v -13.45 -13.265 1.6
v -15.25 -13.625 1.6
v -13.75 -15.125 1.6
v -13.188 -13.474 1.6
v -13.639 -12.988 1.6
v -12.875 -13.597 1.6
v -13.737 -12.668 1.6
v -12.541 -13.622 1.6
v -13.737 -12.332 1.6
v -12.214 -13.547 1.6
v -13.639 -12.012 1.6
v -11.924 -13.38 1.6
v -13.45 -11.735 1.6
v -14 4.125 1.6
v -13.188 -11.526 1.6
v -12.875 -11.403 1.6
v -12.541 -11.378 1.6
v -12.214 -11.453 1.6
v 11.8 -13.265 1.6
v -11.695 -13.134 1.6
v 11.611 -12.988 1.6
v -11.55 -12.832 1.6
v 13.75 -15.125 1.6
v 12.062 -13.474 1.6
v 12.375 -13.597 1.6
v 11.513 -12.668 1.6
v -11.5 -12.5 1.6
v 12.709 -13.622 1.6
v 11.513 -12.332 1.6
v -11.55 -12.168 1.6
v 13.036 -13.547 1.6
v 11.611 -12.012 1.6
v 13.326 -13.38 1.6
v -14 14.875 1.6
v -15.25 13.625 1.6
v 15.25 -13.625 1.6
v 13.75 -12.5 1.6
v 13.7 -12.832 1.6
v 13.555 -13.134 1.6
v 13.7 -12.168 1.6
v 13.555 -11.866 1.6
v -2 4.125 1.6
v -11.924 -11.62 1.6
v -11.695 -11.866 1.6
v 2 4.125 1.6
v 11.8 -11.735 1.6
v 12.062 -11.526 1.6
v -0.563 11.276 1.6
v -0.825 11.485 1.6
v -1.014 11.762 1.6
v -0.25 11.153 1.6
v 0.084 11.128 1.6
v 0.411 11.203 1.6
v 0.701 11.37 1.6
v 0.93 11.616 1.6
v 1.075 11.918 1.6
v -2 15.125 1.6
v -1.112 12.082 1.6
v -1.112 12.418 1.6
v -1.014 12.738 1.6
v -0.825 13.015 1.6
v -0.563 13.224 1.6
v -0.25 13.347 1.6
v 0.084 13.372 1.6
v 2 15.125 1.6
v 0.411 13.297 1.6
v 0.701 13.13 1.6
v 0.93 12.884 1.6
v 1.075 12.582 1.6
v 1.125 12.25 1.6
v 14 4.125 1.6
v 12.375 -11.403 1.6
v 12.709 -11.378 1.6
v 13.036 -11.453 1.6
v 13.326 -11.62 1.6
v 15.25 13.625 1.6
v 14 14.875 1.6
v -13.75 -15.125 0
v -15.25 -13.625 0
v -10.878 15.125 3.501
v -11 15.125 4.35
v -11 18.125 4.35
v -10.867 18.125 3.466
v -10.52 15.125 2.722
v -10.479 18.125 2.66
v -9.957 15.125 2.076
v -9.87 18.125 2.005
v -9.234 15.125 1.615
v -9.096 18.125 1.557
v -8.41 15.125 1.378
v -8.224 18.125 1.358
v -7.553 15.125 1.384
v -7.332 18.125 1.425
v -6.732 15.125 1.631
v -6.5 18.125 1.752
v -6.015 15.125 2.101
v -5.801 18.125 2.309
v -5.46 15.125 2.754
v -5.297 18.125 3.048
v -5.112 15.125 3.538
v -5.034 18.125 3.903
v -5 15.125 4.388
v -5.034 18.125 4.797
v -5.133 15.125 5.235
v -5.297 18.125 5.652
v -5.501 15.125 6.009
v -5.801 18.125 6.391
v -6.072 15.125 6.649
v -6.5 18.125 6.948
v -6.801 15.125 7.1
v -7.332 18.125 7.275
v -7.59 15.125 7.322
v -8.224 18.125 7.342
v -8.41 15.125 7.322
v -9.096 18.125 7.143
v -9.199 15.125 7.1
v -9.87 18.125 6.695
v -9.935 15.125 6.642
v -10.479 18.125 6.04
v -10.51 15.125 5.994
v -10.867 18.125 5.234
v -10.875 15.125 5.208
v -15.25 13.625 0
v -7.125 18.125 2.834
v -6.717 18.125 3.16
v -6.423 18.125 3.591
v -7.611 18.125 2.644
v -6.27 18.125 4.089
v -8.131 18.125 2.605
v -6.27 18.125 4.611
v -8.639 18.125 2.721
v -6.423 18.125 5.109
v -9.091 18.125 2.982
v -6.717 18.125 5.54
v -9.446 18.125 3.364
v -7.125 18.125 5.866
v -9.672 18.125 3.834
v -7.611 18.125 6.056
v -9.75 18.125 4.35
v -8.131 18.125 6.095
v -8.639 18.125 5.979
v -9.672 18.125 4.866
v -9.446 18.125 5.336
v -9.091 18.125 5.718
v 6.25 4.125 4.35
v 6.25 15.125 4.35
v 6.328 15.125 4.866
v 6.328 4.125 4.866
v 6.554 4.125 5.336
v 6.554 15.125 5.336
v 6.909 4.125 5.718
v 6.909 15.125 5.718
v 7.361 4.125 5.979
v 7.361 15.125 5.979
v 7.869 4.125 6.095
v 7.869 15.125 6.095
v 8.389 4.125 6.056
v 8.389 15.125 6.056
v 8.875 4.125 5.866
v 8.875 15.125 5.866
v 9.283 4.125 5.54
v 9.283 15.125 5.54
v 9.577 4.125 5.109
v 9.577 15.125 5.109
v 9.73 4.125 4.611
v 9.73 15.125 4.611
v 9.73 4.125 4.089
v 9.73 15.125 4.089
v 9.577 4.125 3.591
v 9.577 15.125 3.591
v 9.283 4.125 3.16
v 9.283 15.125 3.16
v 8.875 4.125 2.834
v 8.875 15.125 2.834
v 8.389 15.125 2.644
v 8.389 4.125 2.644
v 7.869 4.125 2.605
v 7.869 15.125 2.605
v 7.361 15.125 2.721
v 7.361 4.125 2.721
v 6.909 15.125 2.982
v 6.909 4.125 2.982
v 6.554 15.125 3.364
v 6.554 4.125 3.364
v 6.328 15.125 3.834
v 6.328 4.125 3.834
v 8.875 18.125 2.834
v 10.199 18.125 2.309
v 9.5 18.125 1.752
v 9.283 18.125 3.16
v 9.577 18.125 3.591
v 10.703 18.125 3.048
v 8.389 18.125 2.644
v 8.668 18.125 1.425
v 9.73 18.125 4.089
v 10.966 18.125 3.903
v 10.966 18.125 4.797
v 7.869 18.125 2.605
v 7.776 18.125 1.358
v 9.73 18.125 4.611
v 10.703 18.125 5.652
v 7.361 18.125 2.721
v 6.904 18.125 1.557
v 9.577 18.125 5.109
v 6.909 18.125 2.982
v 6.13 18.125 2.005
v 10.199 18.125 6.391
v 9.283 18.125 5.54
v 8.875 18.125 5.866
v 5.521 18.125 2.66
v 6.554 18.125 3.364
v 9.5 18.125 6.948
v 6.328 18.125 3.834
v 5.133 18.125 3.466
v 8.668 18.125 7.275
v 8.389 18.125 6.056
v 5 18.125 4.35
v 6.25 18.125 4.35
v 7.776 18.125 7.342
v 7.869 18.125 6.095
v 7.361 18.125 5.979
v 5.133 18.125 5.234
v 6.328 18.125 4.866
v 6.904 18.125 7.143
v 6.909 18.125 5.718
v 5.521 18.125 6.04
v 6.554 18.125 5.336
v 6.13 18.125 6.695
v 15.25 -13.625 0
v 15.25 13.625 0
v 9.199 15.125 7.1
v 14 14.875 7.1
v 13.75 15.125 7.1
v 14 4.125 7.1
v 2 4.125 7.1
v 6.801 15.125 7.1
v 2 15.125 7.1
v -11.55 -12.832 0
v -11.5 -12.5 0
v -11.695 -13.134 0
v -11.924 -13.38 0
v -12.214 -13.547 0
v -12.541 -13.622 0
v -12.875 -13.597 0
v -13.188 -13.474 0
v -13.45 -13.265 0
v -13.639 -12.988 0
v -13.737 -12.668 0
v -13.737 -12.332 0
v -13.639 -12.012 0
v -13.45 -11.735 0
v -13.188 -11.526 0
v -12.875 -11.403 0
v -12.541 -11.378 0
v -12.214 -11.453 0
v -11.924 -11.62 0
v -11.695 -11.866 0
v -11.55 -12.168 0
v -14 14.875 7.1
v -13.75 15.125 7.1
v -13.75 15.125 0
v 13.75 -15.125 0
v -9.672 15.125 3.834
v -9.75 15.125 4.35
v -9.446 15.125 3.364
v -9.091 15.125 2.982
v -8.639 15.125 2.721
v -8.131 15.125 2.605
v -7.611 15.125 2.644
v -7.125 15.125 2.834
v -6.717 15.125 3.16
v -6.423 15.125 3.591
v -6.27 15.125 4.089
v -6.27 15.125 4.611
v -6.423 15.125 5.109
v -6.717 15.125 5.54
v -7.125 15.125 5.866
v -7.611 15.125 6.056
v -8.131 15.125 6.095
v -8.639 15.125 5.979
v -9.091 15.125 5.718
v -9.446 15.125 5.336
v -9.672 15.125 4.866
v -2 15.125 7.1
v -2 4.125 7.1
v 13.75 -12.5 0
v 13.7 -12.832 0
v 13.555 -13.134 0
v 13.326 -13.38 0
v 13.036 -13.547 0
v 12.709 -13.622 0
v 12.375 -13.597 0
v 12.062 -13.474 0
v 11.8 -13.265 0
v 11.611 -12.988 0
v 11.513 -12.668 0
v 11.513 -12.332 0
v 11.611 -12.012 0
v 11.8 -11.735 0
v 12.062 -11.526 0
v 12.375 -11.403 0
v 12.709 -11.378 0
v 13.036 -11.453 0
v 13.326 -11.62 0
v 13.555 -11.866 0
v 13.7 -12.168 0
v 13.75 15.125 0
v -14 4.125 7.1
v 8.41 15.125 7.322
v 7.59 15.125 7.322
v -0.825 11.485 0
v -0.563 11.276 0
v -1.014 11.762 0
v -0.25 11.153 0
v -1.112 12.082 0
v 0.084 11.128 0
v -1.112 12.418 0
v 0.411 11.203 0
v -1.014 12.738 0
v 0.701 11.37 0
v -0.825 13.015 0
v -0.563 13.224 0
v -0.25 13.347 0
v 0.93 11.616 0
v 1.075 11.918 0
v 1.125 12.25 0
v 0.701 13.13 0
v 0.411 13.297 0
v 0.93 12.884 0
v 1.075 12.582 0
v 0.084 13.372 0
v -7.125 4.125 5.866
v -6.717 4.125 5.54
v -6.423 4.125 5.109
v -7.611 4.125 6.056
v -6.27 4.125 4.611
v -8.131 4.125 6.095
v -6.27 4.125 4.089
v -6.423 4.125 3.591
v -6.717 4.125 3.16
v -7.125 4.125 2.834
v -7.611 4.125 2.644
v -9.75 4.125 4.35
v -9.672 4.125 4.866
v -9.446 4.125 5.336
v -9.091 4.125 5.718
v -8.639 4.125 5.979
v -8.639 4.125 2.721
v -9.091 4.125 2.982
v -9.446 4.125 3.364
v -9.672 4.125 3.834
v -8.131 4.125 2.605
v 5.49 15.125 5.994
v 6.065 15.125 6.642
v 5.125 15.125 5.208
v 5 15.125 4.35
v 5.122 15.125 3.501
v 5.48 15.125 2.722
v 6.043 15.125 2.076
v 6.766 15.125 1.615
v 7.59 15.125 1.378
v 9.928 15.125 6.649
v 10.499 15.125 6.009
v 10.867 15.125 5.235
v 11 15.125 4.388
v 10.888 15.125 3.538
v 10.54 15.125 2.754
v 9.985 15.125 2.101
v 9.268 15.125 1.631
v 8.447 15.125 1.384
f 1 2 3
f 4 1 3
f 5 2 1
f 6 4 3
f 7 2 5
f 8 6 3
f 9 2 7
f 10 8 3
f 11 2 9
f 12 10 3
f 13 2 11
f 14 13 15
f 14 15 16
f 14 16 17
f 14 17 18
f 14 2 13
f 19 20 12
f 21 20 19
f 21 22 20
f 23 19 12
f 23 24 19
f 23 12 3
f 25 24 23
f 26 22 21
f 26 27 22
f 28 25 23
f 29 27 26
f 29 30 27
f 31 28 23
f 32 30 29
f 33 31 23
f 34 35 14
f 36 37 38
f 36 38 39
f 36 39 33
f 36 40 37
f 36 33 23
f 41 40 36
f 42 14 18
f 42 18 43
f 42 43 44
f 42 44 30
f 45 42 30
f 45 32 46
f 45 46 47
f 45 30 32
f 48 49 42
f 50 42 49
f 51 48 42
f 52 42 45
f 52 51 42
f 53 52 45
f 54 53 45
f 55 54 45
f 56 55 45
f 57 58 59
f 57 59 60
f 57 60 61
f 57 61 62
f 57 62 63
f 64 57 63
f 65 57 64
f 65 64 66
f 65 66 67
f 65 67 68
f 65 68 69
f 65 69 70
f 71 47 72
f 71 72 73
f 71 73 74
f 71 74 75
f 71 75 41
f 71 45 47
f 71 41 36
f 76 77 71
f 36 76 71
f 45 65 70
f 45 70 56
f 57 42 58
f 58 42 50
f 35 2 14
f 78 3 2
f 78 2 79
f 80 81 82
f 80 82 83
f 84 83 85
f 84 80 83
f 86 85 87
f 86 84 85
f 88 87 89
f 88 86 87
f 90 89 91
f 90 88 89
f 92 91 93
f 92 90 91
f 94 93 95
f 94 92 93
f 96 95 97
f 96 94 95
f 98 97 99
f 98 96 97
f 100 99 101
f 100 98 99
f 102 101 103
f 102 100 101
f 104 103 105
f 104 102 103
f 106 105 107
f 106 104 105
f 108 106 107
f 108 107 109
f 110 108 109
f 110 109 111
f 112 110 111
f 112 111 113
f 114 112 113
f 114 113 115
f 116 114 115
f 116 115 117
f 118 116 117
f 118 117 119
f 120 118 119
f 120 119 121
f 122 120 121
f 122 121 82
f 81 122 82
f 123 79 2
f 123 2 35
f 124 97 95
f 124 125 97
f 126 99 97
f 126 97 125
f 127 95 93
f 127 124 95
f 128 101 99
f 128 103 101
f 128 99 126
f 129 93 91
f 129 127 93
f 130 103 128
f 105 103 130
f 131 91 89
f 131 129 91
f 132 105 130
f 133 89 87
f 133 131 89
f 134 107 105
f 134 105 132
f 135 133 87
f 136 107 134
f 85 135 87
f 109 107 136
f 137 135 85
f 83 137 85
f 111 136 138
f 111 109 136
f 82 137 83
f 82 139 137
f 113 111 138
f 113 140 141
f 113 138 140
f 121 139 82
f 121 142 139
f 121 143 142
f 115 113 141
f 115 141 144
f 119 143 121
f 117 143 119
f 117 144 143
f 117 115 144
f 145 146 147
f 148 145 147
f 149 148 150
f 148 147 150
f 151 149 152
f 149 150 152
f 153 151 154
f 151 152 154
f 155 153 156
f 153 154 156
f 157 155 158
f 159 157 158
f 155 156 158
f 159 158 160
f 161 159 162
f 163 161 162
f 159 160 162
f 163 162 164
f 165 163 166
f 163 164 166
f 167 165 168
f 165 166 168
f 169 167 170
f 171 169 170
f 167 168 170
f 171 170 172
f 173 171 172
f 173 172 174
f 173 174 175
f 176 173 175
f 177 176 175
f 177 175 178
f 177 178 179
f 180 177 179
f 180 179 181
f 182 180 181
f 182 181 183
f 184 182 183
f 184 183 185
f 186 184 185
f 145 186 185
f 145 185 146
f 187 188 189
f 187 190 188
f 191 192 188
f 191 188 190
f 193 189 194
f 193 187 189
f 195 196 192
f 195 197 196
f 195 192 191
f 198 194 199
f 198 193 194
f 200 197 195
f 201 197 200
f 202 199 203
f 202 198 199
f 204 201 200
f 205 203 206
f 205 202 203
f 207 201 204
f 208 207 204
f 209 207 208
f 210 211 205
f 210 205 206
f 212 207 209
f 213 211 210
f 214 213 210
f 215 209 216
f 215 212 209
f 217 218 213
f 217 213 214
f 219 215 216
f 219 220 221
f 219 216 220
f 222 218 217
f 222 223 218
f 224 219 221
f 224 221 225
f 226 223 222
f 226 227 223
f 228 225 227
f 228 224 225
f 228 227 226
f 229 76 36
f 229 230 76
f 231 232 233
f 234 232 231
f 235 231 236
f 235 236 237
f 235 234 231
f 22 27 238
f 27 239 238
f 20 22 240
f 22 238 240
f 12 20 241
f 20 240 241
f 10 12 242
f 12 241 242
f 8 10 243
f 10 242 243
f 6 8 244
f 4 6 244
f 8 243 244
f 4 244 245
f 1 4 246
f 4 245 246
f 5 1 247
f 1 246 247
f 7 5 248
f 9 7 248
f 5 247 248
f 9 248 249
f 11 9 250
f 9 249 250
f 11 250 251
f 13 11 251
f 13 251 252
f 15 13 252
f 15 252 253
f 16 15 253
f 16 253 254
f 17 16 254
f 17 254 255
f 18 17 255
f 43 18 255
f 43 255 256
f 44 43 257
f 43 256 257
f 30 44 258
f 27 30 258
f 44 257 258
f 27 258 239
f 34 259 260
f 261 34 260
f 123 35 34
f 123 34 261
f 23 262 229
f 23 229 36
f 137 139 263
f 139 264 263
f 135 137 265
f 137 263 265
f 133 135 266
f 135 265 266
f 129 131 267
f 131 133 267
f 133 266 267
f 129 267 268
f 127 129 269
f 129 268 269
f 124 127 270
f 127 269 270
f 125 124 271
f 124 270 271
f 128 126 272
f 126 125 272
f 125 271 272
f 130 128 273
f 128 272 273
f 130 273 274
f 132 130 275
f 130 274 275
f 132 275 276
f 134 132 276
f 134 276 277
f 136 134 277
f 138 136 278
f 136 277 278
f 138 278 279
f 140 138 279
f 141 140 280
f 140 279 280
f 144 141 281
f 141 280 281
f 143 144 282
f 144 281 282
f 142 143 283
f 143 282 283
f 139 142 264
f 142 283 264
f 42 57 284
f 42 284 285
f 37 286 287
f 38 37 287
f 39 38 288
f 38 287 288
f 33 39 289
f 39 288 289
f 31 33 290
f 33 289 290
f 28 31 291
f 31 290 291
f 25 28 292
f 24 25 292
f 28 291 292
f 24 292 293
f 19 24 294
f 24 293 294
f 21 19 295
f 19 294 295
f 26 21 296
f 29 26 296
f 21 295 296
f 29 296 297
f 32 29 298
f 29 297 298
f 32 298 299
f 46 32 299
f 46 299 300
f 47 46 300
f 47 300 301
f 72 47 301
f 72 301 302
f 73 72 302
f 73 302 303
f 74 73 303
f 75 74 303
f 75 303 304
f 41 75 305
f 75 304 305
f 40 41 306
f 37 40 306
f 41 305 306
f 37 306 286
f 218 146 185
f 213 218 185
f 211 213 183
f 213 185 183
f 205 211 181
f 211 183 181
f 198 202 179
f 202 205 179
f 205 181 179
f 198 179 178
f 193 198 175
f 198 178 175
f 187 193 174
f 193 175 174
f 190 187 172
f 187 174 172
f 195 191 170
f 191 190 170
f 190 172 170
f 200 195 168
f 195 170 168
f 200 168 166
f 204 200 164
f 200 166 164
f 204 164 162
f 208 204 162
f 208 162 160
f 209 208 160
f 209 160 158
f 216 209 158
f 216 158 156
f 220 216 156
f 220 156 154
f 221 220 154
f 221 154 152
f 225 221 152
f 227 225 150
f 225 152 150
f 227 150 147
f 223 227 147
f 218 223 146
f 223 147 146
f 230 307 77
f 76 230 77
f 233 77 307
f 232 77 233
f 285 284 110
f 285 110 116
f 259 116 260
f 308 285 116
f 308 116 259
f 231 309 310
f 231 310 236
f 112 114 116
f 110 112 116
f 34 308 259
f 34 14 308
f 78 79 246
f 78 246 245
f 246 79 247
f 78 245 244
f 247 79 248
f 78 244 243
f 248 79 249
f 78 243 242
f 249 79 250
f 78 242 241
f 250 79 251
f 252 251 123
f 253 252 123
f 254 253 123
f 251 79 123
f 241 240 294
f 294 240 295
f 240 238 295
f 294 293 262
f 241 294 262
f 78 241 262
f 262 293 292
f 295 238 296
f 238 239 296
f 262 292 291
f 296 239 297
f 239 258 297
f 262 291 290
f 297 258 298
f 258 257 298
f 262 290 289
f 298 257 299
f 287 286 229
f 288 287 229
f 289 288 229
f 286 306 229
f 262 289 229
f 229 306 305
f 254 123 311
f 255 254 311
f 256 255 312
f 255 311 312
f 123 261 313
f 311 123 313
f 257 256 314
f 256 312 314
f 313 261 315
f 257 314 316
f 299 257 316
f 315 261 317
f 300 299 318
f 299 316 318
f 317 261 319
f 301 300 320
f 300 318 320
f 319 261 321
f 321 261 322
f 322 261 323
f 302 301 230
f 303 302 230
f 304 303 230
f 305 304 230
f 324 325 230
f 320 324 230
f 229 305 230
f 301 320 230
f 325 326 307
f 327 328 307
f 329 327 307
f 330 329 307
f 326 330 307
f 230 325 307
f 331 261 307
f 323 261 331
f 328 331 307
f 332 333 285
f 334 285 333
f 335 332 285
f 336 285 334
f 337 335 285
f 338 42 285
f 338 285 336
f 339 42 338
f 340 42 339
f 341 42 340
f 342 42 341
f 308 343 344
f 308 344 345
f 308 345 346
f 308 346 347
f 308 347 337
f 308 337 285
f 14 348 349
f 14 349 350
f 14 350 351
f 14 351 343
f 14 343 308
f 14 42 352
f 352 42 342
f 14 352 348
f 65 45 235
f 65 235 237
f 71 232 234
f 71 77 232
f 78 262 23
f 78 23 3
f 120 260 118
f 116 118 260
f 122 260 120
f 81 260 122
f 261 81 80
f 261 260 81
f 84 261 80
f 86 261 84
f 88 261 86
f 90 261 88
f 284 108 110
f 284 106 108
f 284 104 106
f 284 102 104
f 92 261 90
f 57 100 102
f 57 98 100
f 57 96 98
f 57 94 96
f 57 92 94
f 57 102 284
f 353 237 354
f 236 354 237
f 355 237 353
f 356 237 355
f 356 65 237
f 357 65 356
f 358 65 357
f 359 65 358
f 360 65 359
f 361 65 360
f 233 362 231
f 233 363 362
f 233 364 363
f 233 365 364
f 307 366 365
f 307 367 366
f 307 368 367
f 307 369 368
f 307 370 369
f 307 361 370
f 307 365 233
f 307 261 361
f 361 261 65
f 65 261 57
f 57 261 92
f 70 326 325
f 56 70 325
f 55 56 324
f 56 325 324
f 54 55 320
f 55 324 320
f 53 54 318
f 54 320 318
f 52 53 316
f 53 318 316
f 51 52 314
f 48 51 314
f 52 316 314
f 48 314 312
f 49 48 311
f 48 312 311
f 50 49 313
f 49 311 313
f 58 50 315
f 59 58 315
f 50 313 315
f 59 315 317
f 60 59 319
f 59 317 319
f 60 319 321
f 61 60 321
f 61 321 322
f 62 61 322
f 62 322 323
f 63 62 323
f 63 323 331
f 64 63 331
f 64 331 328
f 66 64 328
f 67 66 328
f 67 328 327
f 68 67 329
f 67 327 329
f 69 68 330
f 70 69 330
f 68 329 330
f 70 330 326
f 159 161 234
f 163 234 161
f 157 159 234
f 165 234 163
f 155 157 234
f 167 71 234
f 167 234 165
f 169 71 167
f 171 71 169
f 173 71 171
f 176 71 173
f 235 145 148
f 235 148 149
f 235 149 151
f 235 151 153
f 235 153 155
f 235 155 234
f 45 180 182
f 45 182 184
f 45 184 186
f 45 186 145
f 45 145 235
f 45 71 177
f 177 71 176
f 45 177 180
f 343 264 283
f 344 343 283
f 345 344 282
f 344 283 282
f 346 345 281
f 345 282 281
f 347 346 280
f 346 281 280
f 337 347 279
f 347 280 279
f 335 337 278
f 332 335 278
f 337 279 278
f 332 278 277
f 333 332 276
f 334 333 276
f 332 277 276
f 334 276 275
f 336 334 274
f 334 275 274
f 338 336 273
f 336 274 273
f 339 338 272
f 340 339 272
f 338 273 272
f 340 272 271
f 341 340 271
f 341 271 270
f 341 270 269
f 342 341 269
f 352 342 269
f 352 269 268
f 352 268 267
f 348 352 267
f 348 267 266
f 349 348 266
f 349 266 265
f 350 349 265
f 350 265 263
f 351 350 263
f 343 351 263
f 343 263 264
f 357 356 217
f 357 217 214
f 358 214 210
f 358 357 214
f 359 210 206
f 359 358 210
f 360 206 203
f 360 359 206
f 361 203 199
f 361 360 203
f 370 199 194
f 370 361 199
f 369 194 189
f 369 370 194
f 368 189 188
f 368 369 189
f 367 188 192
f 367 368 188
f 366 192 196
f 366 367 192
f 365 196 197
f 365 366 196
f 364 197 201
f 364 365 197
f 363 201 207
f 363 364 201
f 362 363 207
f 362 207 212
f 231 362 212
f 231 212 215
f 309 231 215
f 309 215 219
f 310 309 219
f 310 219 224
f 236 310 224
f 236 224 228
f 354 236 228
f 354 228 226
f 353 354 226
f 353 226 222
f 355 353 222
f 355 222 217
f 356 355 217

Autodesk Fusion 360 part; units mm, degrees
sketch "Sketch1" plane through (0, 0, 0) normal (0, 0, 1) x (1, 0, 0)
  line L0 (-15.25, 15.125) -> (15.25, 15.125)
  line L1 (15.25, 15.125) -> (15.25, -15.125)
  line L2 (15.25, -15.125) -> (-15.25, -15.125)
  line L3 (-15.25, -15.125) -> (-15.25, 15.125)
  line L4 (-15.25, 15.125) -> (15.25, -15.125) construction
  line L5 (15.25, 15.125) -> (-15.25, -15.125) construction
  dimension "d1" = 30.5
  dimension "d2" = 30.25
extrude "Extrude1" add sketch "Sketch1" along normal blind 1.6
sketch "Sketch2" plane through (0, 0, 1.6) normal (0, 0, 1) x (-1, 0, 0)
  line L0 (15.25, 15.125) -> (-15.25, 15.125)
  line L1 (-15.25, 15.125) -> (-15.25, -15.125)
  line L2 (-15.25, -15.125) -> (15.25, -15.125)
  line L3 (15.25, -15.125) -> (15.25, 15.125)
  line L4 (14, -15.125) -> (2, -15.125)
  line L5 (2, -15.125) -> (2, -4.125)
  line L6 (2, -4.125) -> (14, -4.125)
  line L7 (14, -4.125) -> (14, -15.125)
  line L8 (-2, -15.125) -> (-14, -15.125)
  line L9 (-14, -15.125) -> (-14, -4.125)
  line L10 (-14, -4.125) -> (-2, -4.125)
  line L11 (-2, -4.125) -> (-2, -15.125)
  dimension "d5" = 12
  dimension "d6" = 11
  dimension "d7" = 12
  dimension "d8" = 11
  dimension "d9" = 4
  dimension "d10" = 1.25
extrude "Extrude2" add sketch "Sketch2" along normal blind 5.5 contours L2 L4 L5 L6 L7 | L2 L8 L9 L10 L11
sketch "Sketch3" plane through (0, 15.125, 0) normal (0, 1, 0) x (-1, 0, 0)
  line L0 (-15.25, 0) -> (15.25, 0)
  line L1 (15.25, 0) -> (15.25, 1.6)
  line L2 (15.25, 1.6) -> (14, 1.6)
  line L3 (14, 1.6) -> (14, 7.1)
  line L4 (14, 7.1) -> (2, 7.1)
  line L5 (2, 7.1) -> (2, 1.6)
  line L6 (2, 1.6) -> (-2, 1.6)
  line L7 (-2, 1.6) -> (-2, 7.1)
  line L8 (-2, 7.1) -> (-14, 7.1)
  line L9 (-14, 7.1) -> (-14, 1.6)
  line L10 (-14, 1.6) -> (-15.25, 1.6)
  line L11 (-15.25, 1.6) -> (-15.25, 0)
  line L12 (-2, 1.6) -> (-14, 7.1) construction
  line L13 (2, 1.6) -> (14, 7.1) construction
  circle A0 centre (-8, 4.35) radius 3
  circle A1 centre (8, 4.35) radius 3
  circle A2 centre (-8, 4.35) radius 1.75
  circle A3 centre (8, 4.35) radius 1.75
  dimension "d13" = 6
  dimension "d14" = 6
  dimension "d15" = 3.5
  dimension "d16" = 3.5
extrude "Extrude3" add sketch "Sketch3" along normal blind 3 contours L8 A0 | L8 A0 | L4 A1 | L4 A1
chamfer "Chamfer1" distance 1.5 angle 45 4 edges at (-15.25, -15.125, 0.8) (-15.25, 15.125, 0.8) (15.25, -15.125, 0.8) (15.25, 15.125, 0.8)
sketch "Sketch4" plane through (0, 0, 0) normal (0, 0, -1) x (1, 0, 0)
  line L0 (13.75, -15.125) -> (15.25, -13.625)
  line L1 (15.25, -13.625) -> (15.25, 13.625)
  line L2 (15.25, 13.625) -> (13.75, 15.125)
  line L3 (13.75, 15.125) -> (-13.75, 15.125)
  line L4 (-13.75, 15.125) -> (-15.25, 13.625)
  line L5 (-15.25, 13.625) -> (-15.25, -13.625)
  line L6 (-15.25, -13.625) -> (-13.75, -15.125)
  line L7 (-13.75, -15.125) -> (13.75, -15.125)
  line L8 (0, -15.125) -> (0, 15.125) construction
  circle A0 centre (0, -12.25) radius 1.125
  circle A1 centre (12.625, 12.5) radius 1.125
  circle A2 centre (-12.625, 12.5) radius 1.125
  dimension "d20" = 2.25
  dimension "d21" = 1.75
  dimension "d22" = 1.5
  dimension "d23" = 1.5
  dimension "d24" = 1.5
  dimension "d25" = 1.5
  dimension "d26" = 2.25
  dimension "d27" = 2.25
extrude "Extrude4" cut sketch "Sketch4" against normal blind 1.6 contours A0 | A1 | A2
extrude "Extrude5" cut 2 faces at (7.9535, 15.125, 3.807) (-7.7869, 15.125, 4.893) along direction (0, -1, 0) blind 11
equation "d10 = ( 2.5 / 2 ) * 1 mm"
